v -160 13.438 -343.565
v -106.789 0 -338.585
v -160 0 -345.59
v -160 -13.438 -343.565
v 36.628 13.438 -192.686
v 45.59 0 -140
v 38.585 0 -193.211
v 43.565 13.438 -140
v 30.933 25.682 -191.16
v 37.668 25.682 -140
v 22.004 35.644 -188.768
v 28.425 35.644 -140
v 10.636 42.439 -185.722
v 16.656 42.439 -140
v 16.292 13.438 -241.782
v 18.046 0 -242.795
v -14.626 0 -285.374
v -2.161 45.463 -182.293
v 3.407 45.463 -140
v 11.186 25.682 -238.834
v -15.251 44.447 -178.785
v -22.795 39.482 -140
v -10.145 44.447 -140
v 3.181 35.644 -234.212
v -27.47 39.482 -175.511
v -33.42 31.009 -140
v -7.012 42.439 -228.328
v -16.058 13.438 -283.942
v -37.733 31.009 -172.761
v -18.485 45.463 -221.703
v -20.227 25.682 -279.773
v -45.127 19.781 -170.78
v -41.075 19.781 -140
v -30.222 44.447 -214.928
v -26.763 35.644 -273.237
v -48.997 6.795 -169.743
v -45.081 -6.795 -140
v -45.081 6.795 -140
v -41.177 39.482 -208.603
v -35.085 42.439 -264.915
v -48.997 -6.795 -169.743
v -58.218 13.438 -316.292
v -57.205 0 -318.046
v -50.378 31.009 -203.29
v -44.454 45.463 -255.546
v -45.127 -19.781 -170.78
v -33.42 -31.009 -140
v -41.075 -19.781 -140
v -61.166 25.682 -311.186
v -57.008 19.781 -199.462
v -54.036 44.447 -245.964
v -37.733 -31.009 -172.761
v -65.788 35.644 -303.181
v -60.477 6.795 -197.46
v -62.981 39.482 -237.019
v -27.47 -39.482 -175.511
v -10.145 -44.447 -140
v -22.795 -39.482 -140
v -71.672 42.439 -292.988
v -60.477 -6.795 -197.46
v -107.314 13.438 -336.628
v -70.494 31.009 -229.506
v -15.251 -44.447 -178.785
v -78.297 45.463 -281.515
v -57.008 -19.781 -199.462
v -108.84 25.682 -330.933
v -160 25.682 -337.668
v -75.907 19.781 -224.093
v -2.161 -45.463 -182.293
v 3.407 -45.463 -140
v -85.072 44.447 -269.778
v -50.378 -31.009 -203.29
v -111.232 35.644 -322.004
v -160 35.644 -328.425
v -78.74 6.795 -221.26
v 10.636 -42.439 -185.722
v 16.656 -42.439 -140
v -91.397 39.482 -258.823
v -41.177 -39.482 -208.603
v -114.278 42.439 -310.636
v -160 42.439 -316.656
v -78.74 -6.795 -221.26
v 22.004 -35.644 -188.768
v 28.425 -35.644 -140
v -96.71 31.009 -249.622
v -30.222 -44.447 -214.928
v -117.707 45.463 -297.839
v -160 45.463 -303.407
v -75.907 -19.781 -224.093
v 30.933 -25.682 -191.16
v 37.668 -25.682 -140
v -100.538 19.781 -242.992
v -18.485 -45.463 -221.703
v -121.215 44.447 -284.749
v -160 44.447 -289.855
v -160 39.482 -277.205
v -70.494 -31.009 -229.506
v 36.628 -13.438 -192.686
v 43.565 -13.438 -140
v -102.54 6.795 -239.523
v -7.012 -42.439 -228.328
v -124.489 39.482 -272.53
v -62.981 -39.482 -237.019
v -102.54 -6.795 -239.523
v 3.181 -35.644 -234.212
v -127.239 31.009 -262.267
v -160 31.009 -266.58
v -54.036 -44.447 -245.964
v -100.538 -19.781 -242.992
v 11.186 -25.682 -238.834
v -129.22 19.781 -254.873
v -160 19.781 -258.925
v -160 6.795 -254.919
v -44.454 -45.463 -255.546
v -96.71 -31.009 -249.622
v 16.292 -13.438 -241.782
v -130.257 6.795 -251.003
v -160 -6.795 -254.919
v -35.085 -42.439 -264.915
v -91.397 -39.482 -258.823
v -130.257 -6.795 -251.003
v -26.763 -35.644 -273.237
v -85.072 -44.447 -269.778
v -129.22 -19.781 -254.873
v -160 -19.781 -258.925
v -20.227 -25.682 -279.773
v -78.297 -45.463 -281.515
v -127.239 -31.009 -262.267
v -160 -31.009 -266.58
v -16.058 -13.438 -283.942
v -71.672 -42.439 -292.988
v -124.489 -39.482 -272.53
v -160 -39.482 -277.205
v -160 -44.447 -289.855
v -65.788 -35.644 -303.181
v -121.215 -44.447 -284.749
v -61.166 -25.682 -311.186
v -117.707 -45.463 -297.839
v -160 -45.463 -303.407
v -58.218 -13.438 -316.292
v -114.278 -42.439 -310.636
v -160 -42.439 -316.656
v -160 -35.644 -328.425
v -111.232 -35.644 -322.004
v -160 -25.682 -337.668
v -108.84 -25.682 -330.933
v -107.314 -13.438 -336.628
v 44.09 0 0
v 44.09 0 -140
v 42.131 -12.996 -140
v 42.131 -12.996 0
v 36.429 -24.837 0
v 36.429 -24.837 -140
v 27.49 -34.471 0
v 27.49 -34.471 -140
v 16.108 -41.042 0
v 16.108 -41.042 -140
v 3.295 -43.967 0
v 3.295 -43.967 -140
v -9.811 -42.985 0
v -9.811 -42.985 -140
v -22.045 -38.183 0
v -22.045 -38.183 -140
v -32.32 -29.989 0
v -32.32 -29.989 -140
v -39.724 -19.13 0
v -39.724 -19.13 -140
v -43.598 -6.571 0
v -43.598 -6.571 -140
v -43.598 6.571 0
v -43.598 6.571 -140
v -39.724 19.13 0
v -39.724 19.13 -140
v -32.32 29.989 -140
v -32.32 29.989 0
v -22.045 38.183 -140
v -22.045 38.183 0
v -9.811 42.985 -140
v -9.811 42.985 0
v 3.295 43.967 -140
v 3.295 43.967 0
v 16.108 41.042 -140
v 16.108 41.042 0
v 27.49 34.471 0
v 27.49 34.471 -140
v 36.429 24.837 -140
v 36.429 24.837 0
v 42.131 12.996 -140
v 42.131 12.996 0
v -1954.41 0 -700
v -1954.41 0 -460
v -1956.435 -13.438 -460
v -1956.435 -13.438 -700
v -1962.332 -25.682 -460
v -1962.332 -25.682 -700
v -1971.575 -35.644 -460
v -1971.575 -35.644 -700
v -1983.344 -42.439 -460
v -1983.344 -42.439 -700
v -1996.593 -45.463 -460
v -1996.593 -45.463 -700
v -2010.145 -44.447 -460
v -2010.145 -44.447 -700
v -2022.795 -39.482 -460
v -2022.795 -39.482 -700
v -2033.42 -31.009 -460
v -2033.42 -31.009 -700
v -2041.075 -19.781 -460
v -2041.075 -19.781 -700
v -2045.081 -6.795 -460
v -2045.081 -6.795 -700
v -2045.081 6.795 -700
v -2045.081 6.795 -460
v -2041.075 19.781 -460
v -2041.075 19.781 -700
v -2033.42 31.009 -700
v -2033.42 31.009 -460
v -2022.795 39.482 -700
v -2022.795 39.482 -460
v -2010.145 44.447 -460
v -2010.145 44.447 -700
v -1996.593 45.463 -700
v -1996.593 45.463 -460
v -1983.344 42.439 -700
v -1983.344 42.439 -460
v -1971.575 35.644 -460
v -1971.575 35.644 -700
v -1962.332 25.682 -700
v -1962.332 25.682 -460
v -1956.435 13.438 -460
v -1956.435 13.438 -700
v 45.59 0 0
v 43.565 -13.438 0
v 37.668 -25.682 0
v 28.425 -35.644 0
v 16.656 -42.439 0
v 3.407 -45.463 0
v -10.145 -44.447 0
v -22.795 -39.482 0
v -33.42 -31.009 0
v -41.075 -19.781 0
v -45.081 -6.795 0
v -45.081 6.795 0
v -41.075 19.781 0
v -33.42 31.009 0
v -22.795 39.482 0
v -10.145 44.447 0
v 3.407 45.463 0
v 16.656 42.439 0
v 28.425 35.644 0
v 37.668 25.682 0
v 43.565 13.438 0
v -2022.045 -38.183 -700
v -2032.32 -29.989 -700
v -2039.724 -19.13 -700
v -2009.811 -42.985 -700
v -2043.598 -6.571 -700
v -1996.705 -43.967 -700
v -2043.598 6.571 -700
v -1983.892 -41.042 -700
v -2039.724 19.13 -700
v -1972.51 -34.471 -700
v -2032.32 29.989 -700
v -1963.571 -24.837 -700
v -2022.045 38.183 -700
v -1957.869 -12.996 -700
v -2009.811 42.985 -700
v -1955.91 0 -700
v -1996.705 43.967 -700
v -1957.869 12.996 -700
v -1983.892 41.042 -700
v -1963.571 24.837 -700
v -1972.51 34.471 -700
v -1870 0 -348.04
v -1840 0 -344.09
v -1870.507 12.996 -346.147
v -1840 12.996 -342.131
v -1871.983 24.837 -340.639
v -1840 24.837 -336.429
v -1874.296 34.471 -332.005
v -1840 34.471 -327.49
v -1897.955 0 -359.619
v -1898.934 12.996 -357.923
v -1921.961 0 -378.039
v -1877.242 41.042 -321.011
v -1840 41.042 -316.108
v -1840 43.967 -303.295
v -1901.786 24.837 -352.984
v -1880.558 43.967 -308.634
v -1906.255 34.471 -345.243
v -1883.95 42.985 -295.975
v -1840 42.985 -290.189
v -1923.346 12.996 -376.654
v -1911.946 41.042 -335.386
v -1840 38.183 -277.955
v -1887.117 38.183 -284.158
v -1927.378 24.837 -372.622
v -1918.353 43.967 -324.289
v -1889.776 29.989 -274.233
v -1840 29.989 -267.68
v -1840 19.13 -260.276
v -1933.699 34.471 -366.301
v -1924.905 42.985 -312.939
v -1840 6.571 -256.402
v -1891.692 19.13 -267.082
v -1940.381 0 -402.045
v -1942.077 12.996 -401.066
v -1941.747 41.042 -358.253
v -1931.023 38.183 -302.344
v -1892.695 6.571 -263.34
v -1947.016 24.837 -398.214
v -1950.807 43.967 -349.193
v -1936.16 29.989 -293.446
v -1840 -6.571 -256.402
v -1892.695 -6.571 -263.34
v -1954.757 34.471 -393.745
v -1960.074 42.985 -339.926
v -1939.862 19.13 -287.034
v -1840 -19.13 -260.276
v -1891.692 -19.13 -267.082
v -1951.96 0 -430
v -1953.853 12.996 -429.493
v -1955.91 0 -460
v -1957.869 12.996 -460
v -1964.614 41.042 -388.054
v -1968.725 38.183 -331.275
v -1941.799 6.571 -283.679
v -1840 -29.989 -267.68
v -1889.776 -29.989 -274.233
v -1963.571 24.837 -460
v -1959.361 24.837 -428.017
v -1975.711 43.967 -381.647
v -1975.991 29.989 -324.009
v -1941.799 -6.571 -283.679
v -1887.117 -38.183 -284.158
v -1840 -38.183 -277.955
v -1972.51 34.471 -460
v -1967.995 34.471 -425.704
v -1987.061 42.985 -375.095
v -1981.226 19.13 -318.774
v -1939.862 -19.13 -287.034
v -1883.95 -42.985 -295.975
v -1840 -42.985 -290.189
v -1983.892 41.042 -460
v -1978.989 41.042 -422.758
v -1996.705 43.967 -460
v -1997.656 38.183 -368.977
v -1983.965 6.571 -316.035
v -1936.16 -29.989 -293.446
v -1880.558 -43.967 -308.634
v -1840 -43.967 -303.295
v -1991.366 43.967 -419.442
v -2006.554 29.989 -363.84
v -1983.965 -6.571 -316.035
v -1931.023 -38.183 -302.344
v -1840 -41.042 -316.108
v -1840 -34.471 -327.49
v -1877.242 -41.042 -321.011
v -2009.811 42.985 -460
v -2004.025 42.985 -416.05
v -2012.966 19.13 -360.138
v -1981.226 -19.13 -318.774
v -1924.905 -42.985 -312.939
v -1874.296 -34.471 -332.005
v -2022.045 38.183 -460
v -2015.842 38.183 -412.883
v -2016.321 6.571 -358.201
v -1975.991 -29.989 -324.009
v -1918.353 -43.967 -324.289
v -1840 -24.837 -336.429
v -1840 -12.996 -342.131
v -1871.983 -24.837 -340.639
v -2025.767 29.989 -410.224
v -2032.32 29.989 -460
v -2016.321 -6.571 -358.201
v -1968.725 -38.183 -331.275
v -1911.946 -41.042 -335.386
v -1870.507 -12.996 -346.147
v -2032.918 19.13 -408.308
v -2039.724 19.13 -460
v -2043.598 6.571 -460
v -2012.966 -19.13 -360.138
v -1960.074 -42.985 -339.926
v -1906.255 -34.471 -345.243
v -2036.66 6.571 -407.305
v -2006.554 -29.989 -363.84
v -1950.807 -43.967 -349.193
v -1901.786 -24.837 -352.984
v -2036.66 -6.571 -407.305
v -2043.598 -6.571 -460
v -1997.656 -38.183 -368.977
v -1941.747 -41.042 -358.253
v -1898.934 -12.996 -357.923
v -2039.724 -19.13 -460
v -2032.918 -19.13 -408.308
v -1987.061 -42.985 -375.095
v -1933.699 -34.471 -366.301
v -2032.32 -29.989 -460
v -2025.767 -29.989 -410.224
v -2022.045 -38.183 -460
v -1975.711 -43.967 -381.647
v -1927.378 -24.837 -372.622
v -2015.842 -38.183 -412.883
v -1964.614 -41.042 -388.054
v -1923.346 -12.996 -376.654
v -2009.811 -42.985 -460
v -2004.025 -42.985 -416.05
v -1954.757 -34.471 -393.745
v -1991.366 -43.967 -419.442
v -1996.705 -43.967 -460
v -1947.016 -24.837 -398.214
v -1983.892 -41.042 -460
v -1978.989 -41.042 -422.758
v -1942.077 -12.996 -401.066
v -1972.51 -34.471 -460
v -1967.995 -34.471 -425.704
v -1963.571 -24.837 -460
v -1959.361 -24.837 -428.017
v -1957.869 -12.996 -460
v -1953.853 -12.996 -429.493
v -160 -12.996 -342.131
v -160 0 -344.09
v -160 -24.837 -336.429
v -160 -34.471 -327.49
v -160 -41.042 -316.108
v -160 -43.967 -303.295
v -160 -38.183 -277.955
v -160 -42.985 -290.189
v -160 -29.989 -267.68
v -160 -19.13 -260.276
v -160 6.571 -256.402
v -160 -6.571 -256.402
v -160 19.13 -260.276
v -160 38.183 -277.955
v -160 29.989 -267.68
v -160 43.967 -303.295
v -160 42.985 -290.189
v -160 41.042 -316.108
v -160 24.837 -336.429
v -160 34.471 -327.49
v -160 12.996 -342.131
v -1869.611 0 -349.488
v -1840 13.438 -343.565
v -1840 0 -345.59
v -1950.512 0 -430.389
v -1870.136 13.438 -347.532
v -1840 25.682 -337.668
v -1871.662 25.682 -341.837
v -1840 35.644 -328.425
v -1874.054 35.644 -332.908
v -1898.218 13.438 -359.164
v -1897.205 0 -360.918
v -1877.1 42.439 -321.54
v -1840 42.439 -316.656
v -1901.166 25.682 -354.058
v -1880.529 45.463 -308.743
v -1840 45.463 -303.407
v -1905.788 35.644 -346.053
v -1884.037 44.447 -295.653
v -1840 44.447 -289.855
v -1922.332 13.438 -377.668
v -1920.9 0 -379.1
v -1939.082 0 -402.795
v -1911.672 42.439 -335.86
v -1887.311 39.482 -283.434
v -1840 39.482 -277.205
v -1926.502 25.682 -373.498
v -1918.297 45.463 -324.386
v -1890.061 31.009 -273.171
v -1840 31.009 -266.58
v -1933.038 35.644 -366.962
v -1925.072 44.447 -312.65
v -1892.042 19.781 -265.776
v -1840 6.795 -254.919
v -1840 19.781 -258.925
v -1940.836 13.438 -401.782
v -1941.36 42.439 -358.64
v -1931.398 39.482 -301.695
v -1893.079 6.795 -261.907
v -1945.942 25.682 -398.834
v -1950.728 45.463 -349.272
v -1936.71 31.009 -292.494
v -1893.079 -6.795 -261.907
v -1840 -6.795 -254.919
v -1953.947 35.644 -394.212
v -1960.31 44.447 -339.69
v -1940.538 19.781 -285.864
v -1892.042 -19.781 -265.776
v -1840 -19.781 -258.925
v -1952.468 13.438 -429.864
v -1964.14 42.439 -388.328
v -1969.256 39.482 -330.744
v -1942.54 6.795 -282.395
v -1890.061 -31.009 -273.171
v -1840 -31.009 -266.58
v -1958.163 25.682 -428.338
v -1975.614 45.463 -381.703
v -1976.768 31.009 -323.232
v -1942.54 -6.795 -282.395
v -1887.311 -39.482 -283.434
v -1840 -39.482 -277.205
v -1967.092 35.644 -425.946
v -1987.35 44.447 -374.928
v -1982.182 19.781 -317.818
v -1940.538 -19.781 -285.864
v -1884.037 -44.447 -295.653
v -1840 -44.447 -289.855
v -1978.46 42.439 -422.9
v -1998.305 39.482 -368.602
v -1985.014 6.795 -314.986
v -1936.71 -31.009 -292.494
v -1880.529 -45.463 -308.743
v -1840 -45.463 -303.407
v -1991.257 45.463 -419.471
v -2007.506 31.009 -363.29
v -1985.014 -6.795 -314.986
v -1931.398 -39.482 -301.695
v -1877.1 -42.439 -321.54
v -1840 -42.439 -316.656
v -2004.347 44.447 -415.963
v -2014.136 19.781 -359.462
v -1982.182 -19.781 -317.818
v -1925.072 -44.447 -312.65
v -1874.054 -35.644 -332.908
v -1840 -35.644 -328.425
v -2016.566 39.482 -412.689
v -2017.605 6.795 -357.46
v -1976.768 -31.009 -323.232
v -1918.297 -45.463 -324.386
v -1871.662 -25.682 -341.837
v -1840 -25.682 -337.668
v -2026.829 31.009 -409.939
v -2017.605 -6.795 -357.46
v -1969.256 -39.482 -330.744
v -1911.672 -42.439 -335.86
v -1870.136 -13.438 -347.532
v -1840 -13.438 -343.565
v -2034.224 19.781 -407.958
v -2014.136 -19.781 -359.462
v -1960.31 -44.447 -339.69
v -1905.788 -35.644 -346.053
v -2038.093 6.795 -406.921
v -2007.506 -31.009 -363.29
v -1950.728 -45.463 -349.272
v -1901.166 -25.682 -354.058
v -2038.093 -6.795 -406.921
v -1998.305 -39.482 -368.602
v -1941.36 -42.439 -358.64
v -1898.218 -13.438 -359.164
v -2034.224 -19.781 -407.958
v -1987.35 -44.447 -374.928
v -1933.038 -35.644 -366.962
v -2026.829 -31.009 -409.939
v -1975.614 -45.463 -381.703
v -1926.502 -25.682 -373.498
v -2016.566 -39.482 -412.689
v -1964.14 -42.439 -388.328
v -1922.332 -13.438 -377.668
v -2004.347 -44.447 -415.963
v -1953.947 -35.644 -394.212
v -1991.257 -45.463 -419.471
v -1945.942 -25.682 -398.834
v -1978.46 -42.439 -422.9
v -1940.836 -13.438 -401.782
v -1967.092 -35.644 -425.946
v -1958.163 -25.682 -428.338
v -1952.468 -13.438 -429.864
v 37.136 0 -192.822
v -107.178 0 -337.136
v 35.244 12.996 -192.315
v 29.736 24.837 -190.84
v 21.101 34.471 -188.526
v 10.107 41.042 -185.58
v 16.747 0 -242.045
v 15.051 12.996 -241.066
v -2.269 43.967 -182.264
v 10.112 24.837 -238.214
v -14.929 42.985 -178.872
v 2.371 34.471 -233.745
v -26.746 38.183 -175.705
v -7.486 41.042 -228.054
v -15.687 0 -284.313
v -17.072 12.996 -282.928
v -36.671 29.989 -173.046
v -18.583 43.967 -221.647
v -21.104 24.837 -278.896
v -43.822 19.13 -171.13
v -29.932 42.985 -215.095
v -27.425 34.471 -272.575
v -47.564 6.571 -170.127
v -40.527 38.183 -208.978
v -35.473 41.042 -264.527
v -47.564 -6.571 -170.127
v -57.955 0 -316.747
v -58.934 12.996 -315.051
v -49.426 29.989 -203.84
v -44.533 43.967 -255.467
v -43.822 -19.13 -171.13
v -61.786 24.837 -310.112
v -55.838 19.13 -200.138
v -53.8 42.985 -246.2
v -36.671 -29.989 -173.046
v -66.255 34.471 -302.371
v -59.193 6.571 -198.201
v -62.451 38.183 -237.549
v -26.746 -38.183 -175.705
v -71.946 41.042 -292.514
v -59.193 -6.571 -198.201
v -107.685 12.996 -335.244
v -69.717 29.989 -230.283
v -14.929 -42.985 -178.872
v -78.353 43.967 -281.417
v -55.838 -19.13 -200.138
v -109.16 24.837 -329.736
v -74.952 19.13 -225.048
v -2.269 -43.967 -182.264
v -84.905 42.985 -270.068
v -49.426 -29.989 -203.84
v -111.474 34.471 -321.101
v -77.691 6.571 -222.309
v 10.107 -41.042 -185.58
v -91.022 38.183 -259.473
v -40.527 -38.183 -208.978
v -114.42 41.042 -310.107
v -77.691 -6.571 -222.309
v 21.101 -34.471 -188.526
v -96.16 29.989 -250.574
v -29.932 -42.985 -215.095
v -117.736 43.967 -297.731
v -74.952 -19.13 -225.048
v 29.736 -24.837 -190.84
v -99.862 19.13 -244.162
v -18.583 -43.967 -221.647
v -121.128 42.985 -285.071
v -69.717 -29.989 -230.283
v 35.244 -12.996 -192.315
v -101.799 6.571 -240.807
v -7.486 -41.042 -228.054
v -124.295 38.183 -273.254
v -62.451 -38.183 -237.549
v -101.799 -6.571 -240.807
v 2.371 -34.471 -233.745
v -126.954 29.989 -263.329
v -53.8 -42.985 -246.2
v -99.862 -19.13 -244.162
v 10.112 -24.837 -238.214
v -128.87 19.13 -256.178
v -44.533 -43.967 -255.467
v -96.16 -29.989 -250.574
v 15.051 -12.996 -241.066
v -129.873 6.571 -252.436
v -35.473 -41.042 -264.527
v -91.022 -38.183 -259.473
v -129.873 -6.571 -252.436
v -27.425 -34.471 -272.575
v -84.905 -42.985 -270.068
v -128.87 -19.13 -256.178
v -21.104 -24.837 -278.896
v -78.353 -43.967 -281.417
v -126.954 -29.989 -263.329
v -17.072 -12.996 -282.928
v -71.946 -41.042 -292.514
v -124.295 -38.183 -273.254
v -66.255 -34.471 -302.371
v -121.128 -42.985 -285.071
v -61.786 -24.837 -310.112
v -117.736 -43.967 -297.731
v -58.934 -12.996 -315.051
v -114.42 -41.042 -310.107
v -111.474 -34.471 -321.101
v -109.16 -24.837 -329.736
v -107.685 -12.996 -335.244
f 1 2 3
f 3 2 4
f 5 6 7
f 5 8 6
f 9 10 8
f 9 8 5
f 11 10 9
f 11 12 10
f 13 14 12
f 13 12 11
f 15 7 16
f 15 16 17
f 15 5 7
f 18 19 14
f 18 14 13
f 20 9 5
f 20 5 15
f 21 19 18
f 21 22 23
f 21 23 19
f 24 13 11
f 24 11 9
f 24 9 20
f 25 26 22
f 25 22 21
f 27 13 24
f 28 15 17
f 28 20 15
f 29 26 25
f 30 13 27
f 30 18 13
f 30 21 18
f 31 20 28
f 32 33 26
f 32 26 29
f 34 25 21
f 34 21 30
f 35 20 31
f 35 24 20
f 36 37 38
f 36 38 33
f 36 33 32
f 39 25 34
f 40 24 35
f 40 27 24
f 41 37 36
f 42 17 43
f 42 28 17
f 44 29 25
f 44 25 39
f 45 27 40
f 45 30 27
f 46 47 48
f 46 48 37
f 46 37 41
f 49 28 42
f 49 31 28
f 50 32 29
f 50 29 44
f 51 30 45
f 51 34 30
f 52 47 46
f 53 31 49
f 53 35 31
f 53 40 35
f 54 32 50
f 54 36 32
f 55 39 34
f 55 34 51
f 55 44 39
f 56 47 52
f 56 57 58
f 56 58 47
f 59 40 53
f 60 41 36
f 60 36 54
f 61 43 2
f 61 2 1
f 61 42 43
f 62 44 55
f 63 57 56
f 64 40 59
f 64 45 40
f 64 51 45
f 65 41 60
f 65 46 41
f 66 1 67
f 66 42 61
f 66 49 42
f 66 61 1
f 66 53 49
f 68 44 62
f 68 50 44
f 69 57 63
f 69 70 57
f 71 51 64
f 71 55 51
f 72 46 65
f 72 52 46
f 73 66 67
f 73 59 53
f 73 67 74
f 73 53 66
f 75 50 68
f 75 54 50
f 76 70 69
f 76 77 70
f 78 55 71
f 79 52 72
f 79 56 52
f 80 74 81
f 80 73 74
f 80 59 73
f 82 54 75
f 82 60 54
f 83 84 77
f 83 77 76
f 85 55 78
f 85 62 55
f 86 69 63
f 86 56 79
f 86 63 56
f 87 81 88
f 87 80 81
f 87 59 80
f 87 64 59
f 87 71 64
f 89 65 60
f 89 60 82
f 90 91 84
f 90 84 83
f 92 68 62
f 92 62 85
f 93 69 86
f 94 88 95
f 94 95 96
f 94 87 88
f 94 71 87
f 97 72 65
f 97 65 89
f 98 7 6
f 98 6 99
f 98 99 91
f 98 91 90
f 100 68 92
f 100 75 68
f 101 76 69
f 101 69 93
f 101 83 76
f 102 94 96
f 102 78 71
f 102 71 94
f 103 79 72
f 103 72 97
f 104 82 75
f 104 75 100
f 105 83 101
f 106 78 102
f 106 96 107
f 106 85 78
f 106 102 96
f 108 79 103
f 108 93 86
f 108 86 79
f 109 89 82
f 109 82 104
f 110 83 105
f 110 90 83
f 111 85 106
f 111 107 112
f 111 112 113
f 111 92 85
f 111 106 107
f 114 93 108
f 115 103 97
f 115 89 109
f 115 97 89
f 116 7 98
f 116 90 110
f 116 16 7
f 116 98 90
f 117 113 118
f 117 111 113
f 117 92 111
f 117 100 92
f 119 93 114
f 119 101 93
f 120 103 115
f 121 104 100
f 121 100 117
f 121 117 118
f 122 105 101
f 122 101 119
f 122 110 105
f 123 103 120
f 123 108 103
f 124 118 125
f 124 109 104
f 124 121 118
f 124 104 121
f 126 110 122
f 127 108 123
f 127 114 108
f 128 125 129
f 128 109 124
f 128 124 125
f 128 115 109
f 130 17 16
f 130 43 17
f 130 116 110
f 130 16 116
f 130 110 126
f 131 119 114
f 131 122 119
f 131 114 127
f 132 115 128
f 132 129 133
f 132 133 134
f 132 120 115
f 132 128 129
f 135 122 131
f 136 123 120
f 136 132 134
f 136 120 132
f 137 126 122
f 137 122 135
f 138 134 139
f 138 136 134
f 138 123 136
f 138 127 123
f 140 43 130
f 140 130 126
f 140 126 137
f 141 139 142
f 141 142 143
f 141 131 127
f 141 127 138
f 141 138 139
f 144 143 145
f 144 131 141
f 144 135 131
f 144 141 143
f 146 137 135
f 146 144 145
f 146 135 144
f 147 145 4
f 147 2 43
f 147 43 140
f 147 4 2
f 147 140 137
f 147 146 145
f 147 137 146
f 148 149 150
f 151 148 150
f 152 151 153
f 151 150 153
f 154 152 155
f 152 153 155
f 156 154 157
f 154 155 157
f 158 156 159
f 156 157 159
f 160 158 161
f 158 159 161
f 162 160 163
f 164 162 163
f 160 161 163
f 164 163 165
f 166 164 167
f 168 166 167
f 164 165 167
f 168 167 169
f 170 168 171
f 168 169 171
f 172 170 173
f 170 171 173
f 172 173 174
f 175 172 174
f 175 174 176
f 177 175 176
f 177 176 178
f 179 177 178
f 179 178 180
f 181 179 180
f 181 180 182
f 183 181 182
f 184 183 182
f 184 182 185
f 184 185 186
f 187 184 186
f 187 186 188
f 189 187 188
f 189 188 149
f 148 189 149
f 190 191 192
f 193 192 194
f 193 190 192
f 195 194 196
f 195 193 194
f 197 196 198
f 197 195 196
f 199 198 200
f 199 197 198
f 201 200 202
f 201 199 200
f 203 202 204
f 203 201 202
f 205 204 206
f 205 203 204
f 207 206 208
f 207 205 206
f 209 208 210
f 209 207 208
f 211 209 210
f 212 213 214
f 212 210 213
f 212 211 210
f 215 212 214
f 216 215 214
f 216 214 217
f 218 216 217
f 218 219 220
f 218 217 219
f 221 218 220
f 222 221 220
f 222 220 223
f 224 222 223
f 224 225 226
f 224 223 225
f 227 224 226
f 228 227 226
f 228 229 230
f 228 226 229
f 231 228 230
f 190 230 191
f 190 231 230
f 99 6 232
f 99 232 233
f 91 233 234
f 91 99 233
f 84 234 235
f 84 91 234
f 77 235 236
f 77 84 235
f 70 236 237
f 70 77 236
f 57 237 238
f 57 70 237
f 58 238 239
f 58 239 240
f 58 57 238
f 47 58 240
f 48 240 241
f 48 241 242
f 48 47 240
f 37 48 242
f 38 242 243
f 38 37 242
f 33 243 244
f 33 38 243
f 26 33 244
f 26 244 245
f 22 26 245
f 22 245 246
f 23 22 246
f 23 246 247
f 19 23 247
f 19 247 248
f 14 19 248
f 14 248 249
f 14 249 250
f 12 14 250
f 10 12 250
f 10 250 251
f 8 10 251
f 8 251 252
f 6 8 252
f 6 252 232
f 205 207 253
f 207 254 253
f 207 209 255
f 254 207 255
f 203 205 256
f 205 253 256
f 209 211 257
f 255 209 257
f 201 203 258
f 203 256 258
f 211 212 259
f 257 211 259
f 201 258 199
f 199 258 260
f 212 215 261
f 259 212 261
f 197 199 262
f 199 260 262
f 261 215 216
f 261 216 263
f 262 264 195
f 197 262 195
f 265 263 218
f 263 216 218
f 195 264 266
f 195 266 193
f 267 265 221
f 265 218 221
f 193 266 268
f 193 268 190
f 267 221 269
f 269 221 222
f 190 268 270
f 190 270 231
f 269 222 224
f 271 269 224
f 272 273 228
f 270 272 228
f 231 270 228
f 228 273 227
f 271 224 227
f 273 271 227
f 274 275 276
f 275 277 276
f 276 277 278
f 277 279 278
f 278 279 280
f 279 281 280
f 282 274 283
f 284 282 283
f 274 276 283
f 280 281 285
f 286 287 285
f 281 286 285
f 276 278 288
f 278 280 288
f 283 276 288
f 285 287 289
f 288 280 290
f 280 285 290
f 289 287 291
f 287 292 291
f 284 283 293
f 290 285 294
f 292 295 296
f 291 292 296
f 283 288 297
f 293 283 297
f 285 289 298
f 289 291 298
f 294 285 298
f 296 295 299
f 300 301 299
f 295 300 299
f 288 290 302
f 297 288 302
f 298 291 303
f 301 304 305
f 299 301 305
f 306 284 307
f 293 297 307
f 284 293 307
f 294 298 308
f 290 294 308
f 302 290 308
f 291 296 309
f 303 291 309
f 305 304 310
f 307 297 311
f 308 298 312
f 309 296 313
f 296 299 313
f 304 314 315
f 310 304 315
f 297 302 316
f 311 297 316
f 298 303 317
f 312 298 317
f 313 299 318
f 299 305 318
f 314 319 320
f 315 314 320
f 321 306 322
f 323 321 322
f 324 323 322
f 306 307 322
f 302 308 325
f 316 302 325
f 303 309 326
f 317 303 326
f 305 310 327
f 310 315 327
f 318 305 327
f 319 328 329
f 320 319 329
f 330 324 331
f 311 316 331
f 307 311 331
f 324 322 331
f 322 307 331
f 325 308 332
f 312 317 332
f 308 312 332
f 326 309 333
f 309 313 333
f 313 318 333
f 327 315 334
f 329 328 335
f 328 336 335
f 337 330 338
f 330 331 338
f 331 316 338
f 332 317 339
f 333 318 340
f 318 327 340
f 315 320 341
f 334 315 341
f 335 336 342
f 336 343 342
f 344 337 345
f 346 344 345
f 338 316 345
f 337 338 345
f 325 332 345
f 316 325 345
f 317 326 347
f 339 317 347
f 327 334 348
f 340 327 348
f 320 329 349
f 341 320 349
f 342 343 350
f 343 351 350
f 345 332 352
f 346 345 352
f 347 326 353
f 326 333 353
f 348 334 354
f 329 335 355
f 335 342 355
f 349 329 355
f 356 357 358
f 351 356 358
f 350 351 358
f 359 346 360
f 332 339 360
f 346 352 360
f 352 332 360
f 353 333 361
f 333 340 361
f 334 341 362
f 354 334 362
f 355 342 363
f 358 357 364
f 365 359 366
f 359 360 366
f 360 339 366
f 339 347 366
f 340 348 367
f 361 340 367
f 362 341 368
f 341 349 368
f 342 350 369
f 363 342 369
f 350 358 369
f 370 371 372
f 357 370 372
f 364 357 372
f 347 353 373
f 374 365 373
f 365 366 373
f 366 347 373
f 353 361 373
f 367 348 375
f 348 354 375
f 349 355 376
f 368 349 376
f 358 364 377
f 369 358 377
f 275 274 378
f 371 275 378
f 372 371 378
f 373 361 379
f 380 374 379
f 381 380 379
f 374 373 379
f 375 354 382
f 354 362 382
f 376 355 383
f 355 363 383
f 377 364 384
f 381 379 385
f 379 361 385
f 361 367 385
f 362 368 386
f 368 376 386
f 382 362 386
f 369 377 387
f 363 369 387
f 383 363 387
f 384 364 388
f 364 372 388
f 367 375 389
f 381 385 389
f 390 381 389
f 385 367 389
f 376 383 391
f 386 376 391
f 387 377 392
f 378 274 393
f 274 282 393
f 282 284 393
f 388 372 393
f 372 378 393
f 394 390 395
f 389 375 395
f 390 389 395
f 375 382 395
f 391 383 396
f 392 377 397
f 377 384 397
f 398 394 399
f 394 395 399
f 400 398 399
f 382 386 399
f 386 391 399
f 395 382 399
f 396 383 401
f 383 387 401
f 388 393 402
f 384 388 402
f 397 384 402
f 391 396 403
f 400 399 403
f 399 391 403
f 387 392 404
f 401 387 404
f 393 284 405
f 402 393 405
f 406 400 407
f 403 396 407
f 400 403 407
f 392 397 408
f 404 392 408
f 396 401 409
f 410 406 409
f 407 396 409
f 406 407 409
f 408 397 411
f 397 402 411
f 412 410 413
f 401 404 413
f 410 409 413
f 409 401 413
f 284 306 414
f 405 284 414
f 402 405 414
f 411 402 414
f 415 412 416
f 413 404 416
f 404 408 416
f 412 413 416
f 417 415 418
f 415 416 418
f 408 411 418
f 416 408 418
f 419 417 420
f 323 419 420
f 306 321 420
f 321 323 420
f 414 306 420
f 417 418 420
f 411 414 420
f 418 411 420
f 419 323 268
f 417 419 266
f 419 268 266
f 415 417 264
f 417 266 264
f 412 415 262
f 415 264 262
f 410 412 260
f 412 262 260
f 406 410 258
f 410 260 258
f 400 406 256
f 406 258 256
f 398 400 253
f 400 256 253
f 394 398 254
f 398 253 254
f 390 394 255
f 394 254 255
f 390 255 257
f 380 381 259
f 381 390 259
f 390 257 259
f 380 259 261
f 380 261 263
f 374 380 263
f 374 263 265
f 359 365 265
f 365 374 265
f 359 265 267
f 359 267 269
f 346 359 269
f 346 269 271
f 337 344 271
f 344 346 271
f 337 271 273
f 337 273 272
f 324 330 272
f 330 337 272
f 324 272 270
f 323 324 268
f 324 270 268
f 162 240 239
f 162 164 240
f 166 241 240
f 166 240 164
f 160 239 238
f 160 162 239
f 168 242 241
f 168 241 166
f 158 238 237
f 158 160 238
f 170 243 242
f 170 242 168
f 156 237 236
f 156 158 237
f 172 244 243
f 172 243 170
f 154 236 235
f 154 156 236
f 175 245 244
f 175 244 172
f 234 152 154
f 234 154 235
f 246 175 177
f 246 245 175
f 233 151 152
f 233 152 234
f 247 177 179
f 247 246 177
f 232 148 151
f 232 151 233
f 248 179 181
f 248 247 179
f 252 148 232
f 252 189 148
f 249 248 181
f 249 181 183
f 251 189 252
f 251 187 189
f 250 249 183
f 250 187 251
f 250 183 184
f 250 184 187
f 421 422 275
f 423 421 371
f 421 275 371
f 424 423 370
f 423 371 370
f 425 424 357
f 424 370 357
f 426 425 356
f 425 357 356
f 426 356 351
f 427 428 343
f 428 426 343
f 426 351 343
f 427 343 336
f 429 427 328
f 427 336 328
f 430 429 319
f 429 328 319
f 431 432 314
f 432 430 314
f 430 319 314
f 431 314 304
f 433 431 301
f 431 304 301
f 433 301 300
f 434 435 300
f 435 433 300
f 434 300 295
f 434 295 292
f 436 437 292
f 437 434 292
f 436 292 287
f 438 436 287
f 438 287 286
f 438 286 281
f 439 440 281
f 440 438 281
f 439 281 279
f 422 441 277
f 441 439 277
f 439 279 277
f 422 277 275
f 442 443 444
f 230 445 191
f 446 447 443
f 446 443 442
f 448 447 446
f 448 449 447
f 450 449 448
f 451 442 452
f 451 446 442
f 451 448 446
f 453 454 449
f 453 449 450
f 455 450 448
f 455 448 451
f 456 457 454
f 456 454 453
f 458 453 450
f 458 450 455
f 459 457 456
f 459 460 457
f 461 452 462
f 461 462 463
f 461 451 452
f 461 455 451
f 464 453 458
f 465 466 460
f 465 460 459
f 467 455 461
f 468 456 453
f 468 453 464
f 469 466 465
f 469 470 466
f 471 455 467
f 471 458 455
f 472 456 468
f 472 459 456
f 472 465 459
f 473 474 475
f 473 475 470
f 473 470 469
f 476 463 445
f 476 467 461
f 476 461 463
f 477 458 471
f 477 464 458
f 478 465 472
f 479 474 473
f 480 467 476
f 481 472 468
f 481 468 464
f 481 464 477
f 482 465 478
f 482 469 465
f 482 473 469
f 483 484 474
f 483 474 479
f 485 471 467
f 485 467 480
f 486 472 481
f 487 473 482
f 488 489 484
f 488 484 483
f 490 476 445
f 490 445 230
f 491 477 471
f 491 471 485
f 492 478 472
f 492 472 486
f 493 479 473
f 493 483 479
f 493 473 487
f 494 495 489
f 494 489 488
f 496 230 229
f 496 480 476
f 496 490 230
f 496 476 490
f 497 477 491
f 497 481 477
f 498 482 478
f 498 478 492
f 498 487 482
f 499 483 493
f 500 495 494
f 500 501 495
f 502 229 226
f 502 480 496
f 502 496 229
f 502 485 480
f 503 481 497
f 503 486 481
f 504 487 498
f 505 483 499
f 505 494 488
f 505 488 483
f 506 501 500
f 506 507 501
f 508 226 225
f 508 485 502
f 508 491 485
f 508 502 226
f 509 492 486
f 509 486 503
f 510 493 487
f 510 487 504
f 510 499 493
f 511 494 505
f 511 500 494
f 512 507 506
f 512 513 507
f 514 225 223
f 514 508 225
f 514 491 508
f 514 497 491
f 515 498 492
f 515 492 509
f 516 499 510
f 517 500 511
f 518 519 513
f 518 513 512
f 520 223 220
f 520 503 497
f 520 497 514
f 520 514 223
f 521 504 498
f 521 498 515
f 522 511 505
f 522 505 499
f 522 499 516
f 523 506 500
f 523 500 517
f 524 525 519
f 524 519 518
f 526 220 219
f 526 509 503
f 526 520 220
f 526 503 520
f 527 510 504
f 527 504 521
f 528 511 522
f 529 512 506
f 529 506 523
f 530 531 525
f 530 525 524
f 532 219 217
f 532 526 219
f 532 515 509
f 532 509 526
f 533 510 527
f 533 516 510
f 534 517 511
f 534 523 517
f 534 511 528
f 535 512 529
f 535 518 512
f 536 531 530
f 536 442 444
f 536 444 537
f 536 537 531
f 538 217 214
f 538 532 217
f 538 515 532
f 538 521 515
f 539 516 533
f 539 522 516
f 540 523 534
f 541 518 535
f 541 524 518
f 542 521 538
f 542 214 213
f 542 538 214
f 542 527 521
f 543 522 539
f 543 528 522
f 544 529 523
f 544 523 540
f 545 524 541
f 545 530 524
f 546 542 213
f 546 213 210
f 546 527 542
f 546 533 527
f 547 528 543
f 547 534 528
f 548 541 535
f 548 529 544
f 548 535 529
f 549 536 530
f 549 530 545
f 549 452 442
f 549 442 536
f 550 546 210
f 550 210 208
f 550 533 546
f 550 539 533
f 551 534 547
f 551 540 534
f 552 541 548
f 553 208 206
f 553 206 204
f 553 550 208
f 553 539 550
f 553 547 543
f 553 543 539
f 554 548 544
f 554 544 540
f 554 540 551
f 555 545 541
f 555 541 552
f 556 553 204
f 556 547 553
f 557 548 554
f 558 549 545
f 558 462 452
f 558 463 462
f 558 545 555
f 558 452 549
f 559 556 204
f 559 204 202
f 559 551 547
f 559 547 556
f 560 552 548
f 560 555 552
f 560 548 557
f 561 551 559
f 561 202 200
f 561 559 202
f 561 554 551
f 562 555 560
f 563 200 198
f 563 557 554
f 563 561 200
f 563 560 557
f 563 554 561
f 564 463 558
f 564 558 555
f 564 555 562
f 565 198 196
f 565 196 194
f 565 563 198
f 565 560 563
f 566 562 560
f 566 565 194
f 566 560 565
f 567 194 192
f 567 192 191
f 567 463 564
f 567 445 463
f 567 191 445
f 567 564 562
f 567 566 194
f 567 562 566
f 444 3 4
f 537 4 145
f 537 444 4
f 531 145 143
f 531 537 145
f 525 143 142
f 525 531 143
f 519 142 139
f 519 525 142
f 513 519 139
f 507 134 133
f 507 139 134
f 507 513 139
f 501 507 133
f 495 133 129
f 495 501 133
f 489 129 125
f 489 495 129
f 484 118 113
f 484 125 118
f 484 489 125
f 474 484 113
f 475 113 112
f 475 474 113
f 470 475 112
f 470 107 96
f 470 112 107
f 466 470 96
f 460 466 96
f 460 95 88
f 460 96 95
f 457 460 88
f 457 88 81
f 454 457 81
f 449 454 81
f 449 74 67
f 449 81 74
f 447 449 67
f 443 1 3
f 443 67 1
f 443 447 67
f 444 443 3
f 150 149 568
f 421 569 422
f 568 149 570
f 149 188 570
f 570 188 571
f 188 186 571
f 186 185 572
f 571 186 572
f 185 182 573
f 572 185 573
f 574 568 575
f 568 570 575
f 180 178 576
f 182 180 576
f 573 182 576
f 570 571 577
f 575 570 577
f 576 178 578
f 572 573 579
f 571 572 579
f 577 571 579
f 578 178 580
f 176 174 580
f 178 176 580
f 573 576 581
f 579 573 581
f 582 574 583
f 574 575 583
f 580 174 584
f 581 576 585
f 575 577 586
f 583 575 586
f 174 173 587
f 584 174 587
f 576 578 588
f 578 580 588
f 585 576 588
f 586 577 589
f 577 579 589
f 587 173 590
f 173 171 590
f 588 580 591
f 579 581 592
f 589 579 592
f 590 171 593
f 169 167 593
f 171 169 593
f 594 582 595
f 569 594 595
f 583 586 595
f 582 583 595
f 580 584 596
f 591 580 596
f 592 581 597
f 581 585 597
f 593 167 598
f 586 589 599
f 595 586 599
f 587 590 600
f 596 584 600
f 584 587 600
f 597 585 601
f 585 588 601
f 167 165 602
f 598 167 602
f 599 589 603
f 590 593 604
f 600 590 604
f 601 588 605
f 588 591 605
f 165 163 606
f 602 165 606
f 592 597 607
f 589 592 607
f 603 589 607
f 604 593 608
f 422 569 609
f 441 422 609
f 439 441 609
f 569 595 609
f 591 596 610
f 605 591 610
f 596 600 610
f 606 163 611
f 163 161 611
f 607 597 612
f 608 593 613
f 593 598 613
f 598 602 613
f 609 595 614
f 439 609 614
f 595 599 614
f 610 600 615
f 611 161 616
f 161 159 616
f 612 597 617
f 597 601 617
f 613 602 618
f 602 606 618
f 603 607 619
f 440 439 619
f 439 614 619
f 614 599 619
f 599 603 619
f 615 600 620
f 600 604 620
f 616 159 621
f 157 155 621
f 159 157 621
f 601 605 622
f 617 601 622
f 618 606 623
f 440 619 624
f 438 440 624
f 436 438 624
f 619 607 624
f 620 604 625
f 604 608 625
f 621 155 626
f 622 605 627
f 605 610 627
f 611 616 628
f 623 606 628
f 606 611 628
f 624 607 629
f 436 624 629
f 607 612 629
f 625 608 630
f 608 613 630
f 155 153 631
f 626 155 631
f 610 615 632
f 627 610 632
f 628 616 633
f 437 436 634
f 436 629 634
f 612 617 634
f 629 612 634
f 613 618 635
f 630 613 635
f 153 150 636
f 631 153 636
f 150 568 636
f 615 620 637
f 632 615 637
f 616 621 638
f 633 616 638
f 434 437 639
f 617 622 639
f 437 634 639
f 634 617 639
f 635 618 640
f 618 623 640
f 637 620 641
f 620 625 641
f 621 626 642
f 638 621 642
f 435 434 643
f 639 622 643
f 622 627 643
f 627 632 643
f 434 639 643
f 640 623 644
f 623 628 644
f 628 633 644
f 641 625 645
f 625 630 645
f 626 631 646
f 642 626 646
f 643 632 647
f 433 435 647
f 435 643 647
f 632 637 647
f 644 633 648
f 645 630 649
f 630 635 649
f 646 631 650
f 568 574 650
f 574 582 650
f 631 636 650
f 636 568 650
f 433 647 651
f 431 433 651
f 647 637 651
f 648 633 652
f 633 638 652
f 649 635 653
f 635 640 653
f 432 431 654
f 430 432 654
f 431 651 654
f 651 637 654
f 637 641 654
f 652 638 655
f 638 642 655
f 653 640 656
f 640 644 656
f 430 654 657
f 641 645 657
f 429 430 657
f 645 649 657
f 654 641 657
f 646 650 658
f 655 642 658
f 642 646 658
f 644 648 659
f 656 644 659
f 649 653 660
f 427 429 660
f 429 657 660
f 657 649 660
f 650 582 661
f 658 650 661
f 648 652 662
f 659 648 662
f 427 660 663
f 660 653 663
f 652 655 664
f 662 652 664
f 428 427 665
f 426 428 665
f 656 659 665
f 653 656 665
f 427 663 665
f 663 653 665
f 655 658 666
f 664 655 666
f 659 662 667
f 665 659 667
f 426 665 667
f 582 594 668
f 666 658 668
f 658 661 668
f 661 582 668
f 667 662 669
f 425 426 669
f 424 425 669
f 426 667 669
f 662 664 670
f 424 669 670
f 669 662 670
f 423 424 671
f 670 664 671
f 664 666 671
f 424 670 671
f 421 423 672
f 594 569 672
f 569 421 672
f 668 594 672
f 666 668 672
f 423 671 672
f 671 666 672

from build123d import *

# Parameters (mm, degrees)
SKETCH2_R   = 45.59
SKETCH2_R_2 = 44.09


with BuildPart() as part:
    # Sweep1: sweep along a path in Sketch1
    with BuildLine(Plane(origin=(0, 0, 0), x_dir=(1, 0, 0), z_dir=(0, 1, 0))) as sweep1_path:
        Line((0, 0), (0, 140))
        ThreePointArc((0, 140), (-46.86291501, 253.13708499), (-160, 300))
        Line((-160, 300), (-1840, 300))
        ThreePointArc((-1840, 300), (-1953.13708499, 346.86291501), (-2000, 460))
        Line((-2000, 460), (-2000, 700))
    # Sketch2 → Sweep1 (sweep)
    with BuildSketch(Plane.XY):
        Circle(SKETCH2_R)
        Circle(SKETCH2_R_2, mode=Mode.SUBTRACT)
    sweep(path=sweep1_path.line)


solid = part.part
